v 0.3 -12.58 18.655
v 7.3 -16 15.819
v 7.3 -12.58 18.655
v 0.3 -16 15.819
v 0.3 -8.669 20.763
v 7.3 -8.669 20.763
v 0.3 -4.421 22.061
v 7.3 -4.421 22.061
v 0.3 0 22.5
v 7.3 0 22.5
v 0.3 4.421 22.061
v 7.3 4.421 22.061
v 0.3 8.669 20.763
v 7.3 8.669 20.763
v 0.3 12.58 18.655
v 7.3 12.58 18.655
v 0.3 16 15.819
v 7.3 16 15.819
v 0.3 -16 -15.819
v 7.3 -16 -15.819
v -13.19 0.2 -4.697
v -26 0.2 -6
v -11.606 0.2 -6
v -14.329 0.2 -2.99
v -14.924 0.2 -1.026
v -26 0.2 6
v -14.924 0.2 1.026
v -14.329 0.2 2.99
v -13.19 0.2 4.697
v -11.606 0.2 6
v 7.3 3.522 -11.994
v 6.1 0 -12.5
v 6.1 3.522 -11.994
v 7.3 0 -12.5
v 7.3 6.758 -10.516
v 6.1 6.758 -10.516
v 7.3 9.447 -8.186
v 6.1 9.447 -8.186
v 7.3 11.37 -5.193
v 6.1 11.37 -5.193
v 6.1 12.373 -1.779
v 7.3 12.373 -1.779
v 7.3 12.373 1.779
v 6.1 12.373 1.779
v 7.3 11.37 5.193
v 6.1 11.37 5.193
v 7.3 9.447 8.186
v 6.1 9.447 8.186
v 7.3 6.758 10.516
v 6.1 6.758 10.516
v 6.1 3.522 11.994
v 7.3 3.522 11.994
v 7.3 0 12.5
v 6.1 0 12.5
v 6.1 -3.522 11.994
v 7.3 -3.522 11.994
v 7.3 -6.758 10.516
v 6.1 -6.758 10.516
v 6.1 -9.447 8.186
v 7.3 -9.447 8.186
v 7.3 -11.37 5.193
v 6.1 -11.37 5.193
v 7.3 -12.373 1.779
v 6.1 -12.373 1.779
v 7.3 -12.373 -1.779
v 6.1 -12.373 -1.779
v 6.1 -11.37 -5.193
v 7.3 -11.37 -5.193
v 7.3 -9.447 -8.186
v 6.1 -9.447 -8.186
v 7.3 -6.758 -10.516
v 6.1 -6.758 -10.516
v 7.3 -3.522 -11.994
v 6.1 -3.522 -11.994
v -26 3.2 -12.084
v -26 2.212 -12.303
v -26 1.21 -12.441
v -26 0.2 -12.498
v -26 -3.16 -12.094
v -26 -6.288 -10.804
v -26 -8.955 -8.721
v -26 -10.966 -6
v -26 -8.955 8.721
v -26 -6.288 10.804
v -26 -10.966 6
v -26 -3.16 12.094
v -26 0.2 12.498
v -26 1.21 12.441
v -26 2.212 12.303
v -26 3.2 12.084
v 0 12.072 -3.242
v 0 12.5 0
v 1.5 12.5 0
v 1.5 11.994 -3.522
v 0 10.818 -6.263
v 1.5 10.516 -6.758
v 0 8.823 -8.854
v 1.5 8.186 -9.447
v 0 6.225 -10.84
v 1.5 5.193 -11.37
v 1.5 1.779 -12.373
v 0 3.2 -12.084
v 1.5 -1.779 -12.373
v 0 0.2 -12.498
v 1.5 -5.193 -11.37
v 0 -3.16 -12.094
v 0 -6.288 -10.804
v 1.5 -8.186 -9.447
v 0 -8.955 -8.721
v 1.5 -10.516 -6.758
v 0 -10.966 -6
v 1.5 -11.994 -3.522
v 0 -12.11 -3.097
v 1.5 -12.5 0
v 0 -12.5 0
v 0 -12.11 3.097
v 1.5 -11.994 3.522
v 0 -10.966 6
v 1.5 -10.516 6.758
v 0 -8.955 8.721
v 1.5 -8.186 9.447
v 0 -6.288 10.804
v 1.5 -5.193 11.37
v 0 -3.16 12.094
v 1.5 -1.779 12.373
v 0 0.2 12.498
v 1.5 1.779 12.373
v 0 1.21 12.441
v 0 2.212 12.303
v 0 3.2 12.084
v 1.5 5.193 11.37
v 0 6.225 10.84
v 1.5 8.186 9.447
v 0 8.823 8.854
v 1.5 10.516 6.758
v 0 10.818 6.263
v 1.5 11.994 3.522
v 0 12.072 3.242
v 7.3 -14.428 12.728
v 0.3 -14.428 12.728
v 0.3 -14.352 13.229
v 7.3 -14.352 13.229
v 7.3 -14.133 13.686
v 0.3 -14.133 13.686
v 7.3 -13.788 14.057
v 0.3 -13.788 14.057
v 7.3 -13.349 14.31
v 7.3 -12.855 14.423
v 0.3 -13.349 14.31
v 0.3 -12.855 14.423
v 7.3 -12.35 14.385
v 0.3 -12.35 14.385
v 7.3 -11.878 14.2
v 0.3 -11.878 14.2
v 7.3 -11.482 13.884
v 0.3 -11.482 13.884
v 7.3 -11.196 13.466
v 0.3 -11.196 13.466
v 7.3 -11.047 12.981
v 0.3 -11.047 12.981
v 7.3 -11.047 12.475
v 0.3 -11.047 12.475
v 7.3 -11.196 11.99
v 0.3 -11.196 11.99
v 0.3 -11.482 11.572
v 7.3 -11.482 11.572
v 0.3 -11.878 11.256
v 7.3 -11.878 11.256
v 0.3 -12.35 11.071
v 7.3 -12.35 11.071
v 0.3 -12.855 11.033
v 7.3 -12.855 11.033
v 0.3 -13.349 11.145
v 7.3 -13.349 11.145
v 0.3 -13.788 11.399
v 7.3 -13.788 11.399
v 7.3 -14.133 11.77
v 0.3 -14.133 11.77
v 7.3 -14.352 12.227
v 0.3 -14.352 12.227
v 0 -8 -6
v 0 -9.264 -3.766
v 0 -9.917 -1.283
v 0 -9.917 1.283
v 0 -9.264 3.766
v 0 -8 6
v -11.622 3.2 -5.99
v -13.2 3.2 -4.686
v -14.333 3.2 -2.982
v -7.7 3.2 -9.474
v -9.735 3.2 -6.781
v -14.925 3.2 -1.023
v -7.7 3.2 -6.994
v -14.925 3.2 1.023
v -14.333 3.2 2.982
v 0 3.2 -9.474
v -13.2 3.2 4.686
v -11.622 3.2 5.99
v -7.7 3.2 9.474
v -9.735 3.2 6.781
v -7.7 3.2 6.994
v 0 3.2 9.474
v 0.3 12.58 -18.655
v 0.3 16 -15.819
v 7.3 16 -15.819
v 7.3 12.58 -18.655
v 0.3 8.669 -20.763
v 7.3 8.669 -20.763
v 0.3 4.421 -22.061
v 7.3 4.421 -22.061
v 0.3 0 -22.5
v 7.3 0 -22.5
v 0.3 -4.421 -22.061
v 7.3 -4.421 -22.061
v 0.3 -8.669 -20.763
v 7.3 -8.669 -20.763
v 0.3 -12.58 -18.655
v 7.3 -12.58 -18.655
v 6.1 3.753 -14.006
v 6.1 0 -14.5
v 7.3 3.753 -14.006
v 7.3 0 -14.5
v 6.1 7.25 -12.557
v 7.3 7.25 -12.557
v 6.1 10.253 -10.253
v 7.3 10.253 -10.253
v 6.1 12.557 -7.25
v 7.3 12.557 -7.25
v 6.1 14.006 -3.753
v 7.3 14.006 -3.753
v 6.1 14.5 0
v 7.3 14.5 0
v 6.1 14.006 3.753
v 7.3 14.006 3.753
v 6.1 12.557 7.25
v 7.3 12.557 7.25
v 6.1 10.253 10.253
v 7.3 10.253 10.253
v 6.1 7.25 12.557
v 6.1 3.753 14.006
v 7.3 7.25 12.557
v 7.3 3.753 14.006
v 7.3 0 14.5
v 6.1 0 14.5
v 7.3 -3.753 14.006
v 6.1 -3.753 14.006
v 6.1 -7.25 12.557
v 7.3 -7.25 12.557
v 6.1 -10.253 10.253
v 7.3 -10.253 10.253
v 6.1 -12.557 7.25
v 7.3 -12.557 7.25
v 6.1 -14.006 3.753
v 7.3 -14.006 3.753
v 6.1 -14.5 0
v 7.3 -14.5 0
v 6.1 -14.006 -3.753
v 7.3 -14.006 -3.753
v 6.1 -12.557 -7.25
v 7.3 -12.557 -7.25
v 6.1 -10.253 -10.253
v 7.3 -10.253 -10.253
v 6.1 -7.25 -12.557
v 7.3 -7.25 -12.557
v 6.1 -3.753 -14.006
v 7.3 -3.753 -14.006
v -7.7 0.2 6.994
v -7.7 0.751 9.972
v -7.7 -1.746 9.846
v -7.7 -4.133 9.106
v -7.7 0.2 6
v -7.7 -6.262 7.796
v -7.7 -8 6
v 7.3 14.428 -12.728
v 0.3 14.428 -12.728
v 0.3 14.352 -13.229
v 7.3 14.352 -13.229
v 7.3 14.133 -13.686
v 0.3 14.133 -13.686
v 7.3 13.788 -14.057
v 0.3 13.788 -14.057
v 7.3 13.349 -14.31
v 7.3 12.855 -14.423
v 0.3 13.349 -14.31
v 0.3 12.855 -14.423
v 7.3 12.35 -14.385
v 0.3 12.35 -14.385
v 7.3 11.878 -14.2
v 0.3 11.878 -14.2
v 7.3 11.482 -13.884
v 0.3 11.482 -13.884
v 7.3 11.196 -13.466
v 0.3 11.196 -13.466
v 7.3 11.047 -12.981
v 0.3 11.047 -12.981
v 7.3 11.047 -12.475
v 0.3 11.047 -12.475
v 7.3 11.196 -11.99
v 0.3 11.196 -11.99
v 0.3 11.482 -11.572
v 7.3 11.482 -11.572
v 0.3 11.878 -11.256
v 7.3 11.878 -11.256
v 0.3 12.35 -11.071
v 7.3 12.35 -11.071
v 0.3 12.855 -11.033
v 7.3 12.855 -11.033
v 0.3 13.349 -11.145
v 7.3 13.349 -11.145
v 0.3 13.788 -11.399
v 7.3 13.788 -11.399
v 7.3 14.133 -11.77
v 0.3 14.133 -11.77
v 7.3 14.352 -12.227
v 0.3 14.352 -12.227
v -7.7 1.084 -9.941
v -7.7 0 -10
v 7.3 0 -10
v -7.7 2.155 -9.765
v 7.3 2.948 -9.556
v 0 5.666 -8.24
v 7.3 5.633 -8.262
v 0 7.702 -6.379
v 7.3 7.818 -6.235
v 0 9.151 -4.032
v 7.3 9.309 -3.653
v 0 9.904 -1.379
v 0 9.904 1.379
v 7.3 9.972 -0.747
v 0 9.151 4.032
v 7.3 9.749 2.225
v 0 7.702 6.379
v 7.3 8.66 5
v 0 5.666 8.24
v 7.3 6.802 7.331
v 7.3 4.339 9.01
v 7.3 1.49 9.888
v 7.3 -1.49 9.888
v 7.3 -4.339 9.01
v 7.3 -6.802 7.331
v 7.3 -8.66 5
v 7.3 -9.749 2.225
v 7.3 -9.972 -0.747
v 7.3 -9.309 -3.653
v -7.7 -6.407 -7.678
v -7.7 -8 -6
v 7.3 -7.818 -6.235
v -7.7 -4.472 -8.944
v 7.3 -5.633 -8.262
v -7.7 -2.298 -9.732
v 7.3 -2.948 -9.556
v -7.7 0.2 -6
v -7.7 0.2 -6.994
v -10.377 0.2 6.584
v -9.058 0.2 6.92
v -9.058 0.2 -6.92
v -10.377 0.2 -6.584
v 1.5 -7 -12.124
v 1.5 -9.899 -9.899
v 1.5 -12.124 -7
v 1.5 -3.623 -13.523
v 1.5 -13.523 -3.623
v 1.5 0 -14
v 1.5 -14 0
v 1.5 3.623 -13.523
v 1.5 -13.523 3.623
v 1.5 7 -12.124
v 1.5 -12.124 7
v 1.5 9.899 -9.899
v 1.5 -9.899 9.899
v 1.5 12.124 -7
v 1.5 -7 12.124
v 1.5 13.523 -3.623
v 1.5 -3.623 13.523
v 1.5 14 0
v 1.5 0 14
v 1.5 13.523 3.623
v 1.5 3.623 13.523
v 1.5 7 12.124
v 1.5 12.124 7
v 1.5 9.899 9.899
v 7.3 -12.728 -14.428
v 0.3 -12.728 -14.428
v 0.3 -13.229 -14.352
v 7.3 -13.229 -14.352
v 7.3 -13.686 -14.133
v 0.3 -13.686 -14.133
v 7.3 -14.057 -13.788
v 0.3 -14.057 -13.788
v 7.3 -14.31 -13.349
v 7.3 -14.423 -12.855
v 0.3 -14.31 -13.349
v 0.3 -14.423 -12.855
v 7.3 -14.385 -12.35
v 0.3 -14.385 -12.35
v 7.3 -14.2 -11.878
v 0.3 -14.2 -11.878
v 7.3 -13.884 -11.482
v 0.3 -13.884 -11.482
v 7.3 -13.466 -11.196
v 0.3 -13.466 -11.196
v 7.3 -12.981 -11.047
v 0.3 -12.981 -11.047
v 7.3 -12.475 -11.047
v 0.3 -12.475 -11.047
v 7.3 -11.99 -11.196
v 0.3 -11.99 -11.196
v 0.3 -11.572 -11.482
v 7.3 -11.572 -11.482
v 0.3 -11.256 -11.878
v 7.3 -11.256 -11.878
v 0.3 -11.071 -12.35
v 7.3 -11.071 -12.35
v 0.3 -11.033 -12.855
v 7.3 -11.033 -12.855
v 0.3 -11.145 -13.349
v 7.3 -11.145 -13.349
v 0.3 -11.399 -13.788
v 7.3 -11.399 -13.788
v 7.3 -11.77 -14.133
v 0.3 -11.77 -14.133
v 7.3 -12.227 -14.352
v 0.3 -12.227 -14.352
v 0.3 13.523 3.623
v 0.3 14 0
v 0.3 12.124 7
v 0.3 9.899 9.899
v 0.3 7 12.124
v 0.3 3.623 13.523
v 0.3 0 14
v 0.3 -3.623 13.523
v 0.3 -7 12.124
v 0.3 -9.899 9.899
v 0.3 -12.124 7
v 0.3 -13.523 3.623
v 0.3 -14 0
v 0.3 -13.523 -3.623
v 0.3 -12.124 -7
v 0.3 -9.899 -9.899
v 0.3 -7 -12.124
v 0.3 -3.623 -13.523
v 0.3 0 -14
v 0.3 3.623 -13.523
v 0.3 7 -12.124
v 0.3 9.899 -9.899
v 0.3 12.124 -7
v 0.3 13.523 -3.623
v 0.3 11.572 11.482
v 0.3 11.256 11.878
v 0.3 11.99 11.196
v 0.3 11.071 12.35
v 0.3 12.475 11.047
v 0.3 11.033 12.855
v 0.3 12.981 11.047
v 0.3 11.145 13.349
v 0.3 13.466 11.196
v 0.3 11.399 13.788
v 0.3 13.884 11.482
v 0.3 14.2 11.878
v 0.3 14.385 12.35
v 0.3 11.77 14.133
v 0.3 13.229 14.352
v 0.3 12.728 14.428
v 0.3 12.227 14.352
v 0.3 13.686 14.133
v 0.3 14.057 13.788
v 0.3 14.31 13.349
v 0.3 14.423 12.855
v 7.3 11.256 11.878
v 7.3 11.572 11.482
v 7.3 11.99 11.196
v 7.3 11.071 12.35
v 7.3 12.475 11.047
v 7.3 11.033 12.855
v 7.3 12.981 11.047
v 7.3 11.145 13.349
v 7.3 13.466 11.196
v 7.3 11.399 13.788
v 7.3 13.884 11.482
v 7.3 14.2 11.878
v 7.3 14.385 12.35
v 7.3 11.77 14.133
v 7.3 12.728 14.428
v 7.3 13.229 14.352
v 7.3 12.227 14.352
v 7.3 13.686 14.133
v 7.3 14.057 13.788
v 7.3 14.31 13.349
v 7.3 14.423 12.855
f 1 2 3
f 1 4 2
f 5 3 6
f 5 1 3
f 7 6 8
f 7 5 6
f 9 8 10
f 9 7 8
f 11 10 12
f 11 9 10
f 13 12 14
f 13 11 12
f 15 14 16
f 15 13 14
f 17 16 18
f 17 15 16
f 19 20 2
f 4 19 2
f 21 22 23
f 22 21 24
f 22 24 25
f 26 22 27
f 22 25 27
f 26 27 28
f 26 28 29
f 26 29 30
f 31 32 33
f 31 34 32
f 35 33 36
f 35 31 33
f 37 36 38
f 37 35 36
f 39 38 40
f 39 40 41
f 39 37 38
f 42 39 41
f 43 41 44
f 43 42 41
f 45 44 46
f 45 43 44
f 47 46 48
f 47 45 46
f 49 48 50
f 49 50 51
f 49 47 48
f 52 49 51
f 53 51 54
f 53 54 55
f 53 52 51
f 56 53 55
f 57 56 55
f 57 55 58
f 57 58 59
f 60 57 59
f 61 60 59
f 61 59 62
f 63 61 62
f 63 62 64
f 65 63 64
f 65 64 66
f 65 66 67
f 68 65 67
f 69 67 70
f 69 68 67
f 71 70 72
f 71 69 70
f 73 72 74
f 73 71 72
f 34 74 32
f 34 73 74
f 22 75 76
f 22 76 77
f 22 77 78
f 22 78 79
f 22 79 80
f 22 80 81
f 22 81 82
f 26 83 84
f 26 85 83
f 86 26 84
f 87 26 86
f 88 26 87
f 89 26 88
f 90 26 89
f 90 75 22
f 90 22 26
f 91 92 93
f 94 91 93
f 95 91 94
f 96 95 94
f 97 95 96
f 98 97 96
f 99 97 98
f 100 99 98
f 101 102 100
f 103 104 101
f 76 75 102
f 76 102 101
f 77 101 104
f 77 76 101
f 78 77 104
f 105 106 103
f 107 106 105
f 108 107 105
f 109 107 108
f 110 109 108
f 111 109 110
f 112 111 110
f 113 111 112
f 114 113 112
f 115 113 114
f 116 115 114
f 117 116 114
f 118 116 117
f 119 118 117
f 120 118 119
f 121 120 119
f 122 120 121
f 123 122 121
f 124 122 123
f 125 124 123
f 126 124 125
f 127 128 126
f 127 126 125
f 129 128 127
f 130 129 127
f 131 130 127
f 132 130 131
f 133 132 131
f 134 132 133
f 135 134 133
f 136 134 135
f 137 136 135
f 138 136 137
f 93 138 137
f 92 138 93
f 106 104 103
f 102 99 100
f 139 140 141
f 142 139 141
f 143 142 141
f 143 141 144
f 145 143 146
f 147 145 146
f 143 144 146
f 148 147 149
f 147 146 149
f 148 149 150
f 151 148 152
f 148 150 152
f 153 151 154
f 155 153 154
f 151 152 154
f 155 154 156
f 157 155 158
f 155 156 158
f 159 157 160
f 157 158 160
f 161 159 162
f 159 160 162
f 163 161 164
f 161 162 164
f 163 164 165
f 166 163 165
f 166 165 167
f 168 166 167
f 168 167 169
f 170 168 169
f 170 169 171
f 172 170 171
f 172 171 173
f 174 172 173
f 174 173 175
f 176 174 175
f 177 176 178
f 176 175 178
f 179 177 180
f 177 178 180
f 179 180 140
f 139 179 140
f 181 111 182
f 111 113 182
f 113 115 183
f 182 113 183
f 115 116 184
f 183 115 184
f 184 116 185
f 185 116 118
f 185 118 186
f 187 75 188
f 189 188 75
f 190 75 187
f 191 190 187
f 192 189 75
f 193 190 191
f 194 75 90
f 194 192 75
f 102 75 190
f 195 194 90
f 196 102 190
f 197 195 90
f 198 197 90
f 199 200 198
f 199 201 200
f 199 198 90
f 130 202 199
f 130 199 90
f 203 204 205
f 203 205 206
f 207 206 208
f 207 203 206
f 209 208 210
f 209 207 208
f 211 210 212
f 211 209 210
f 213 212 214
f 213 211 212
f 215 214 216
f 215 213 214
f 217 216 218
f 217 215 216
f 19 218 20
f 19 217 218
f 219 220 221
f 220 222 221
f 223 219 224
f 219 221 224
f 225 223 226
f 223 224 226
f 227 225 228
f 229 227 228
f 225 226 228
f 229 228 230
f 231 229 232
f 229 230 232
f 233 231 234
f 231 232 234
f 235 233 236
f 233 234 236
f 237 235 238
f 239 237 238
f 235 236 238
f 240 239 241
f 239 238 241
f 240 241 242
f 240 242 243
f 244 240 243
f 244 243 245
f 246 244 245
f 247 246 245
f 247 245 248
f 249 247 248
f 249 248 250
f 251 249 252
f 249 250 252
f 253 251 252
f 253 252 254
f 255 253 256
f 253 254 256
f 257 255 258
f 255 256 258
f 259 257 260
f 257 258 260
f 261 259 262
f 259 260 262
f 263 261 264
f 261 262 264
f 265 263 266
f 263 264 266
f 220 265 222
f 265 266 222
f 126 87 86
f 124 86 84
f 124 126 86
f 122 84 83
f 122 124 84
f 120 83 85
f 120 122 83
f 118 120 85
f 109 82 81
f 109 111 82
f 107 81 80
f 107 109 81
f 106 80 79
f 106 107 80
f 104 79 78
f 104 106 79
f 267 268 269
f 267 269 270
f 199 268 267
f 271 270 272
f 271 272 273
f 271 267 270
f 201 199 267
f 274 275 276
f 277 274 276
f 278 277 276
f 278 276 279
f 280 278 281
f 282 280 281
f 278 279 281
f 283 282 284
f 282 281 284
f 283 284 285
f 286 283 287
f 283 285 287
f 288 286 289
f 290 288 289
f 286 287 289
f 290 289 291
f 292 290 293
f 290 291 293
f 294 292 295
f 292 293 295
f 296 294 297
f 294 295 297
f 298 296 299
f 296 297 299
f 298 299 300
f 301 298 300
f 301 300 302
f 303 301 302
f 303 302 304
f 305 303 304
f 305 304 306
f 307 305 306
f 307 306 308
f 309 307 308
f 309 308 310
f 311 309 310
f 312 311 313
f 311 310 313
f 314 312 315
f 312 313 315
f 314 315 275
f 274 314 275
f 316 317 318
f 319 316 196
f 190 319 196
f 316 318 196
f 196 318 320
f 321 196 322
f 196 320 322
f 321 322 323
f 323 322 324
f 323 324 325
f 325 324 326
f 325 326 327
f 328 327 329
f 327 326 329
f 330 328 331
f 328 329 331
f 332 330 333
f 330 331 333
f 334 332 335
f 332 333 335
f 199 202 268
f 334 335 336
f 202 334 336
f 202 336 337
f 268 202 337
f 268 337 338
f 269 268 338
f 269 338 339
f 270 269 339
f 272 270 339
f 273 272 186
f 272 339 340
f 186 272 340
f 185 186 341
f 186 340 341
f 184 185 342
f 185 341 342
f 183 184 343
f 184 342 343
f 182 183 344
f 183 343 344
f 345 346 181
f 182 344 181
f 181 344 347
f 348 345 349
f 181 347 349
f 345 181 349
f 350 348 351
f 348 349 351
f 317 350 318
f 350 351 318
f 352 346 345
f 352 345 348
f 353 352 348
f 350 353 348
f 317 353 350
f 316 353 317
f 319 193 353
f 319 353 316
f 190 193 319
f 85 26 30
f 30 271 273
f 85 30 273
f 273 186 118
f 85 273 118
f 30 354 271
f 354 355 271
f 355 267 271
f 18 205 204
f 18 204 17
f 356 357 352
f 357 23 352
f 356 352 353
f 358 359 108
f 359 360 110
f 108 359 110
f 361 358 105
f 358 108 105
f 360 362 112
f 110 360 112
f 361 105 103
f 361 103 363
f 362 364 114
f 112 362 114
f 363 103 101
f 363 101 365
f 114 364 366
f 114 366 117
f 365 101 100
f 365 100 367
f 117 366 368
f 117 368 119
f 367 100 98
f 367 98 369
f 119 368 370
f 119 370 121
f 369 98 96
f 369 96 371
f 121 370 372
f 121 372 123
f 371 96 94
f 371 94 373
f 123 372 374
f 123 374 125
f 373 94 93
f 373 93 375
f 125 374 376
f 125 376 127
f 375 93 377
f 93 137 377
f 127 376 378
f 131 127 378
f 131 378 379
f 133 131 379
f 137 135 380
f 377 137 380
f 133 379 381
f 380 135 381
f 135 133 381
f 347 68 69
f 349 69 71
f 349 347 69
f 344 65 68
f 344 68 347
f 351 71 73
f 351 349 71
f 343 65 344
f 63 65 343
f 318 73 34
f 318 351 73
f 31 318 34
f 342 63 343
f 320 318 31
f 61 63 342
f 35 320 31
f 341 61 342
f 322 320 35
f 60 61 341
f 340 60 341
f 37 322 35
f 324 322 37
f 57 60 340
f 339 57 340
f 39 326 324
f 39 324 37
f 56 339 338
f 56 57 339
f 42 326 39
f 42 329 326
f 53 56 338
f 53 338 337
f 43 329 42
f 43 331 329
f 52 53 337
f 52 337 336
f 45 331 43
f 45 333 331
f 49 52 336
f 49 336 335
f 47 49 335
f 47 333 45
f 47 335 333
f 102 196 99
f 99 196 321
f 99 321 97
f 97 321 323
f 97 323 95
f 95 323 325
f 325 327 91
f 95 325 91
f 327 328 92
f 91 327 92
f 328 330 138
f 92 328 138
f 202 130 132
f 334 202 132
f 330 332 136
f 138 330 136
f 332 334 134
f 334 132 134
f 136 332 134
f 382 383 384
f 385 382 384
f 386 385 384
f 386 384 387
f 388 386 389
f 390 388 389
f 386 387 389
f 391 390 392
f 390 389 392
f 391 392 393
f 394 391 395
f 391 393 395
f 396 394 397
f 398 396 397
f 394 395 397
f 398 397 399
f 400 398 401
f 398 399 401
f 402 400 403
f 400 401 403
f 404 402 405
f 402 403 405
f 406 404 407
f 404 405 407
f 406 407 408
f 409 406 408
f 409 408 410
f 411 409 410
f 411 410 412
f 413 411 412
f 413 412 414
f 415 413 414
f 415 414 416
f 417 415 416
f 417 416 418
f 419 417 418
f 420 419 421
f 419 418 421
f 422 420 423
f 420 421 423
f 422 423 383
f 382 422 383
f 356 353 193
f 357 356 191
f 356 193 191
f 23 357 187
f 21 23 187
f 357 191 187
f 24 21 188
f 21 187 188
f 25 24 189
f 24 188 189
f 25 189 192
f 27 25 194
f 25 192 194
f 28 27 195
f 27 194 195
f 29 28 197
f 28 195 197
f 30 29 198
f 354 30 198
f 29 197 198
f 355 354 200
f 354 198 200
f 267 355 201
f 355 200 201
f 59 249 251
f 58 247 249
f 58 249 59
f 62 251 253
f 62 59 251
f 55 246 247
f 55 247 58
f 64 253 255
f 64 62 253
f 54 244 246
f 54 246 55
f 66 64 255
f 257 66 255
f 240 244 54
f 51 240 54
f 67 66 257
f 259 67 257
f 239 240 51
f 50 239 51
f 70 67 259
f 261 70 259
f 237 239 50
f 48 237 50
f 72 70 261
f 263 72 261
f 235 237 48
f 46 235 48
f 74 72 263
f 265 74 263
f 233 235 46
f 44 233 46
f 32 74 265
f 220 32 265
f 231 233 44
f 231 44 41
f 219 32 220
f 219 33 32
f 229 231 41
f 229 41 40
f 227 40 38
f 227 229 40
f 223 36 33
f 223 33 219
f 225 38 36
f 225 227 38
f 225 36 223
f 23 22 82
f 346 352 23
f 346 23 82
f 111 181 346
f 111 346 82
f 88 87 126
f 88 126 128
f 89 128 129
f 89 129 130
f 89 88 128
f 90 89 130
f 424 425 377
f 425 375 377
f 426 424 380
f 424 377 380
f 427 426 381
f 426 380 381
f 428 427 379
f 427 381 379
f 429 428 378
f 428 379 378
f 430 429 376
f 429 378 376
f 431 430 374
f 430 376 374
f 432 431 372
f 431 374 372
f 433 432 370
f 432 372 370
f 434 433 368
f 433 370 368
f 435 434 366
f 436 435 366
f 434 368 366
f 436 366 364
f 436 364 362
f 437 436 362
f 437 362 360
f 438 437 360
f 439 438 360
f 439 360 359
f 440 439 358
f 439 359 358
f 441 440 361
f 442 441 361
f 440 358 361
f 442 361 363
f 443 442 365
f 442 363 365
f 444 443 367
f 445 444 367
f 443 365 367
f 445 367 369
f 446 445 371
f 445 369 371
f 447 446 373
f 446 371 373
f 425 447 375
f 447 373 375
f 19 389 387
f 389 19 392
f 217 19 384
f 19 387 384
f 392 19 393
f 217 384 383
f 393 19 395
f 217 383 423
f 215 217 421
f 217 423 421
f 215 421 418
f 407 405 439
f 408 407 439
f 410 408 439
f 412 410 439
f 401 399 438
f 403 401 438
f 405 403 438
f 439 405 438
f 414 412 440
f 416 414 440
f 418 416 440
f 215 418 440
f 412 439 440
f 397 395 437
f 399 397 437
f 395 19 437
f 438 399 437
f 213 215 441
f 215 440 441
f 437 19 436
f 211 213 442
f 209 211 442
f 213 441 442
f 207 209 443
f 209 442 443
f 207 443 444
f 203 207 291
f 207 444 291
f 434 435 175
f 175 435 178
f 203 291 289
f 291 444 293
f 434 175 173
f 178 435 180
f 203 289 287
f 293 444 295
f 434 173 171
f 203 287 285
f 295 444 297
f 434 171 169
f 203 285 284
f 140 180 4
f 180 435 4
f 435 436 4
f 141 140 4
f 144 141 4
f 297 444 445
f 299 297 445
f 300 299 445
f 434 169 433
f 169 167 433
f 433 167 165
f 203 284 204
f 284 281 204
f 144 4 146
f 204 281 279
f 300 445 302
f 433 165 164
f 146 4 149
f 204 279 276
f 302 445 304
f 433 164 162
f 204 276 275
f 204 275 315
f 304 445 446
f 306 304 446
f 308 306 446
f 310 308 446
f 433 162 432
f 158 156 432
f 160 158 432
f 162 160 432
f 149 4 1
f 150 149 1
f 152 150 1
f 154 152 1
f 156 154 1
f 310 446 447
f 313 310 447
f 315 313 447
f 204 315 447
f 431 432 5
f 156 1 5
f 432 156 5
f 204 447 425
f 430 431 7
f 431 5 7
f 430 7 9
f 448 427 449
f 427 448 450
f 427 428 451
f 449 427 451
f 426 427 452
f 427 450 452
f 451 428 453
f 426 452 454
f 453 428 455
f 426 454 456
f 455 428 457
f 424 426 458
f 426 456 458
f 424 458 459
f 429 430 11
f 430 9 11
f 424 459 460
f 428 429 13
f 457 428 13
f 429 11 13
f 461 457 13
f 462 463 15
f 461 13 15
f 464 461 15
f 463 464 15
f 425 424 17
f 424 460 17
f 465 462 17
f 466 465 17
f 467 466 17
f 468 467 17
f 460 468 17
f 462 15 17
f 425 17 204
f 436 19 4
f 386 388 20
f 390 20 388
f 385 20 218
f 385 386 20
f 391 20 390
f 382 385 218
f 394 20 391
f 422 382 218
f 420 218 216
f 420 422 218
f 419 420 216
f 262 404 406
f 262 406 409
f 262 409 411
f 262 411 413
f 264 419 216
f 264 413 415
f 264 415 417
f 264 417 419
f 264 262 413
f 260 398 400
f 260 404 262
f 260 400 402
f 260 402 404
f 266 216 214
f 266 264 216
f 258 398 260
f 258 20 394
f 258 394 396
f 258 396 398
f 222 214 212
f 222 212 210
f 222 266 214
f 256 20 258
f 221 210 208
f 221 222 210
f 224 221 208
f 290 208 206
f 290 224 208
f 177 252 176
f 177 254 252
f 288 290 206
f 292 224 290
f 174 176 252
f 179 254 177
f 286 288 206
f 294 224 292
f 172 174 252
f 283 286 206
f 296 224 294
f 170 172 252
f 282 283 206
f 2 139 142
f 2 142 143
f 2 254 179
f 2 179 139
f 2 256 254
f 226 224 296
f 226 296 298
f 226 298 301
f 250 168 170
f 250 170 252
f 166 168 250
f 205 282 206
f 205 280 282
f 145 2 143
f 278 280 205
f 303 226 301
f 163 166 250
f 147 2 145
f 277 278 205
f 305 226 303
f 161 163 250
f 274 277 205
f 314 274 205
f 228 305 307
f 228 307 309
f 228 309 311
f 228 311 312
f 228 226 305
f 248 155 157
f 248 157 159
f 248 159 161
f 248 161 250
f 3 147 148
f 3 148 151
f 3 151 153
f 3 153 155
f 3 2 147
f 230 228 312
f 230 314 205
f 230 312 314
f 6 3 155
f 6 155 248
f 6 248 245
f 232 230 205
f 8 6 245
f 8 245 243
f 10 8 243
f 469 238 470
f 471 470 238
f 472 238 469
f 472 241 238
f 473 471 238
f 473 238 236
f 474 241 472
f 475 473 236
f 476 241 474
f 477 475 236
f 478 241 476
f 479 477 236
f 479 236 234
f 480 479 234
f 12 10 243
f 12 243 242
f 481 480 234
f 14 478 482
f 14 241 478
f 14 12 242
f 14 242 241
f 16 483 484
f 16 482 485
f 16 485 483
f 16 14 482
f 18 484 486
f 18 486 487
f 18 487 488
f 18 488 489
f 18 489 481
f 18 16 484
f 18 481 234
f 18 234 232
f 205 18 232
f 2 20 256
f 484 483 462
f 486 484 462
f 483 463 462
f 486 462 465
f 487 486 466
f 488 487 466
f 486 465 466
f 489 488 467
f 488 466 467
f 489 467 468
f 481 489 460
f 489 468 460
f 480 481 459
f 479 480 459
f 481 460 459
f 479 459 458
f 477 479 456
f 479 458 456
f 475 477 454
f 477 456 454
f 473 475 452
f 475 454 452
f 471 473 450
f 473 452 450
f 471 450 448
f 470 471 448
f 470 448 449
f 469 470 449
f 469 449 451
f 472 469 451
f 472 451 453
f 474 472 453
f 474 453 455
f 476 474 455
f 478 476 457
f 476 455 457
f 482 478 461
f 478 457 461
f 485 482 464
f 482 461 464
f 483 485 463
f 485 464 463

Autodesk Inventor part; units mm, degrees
ref_plane "YZ Plane" through (0, 0, 0) normal (1, 0, 0) x (0, 1, 0)
ref_plane "XZ Plane" through (0, 0, 0) normal (0, 1, 0) x (-1, 0, 0)
ref_plane "XY Plane" through (0, 0, 0) normal (0, 0, 1) x (1, 0, 0)
sketch "Sketch4" plane through (0, 0, 0) normal (0, 0, 1) x (1, 0, 0)
  line L0 (0, 0) -> (7.3, 0)
  line L1 (7.3, 0) -> (7.3, 22.5)
  line L2 (7.3, 22.5) -> (0.3, 22.5)
  line L3 (0.3, 22.5) -> (0.3, 14)
  line L4 (0.3, 14) -> (1.5, 14)
  line L5 (1.5, 14) -> (1.5, 12.5)
  line L6 (1.5, 12.5) -> (0, 12.5)
  line L7 (0, 12.5) -> (0, 7.5)
  line L8 (0, 7.5) -> (0, 7.5)
  line L9 (0, 7.5) -> (0, 0)
  dimension "d44" = 25
  dimension "d45" = 1.5
  dimension "d46" = 1.2
  dimension "d47" = 1.5
  dimension "d53" = 45
  dimension "d58" = 7
  dimension "d59" = 15
  dimension "d60" = 0
revolve "Revolution2" add sketch "Sketch4" angle 360 about axis through (0, 0, 0) along (1, 0, 0)
sketch "Sketch7" plane through (7.3, 0, 0) normal (1, 0, 0) x (0, 0, -1)
  line L0 (-20, 26) -> (20, 26)
  line L1 (20, 26) -> (20, 16)
  line L2 (20, 16) -> (-20, 16)
  line L3 (-20, 16) -> (-20, 26)
  line L4 (20, -16) -> (-20, -16)
  line L5 (-20, -16) -> (-20, -26)
  line L6 (-20, -26) -> (20, -26)
  line L7 (20, -26) -> (20, -16)
  point P0 (0, 0)
  point P1 (0, 16)
  point P2 (0, -16)
  dimension "d61" = 16
  dimension "d62" = 16
  dimension "d63" = 10
  dimension "d64" = 10
  dimension "d65" = 20
extrude "Extrusion2" cut sketch "Sketch7" against normal blind 20
sketch "Sketch10" plane through (0, 0, 0) normal (-1, 0, 0) x (0, 0, 1)
  circle A0 centre (0, 0) radius 12.5 projected
  circle A1 centre (0, 0) radius 12.5 projected
  line L0 (-12.5, 0) -> (12.5, 0) construction
  line L1 (-12.4984, 0.2) -> (12.4984, 0.2)
  line L2 (-12.0835, 3.2) -> (12.0835, 3.2)
  point P0 (-12.4984, 0.2)
  point P1 (12.4984, 0.2)
  dimension "d72" = 0.2
  dimension "d73" = 3
extrude "Extrusion4" add sketch "Sketch10" along normal blind 26 contours L1 A0 L2
sketch "Sketch11" plane through (0, 3.2, 12.0835) normal (0, 1, 0) x (1, 0, 0)
  circle A0 centre (-8, 12.0835) radius 5 construction
  circle A1 centre (-8, 12.0835) radius 7
  point P0 (0, 12.0835)
  dimension "d76" = 14
extrude "Extrusion5" cut sketch "Sketch11" against normal through all
sketch "Sketch12" plane through (0, 0, 0) normal (-1, 0, 0) x (0, 0, 1)
  line L0 (12.4984, 0.2) -> (-12.4984, 0.2) projected
  arc A0 (-12.4984, 0.2) -> (12.4984, 0.2) centre (0, 0) ccw projected
  line L1 (-6, 0.2) -> (-6, -10.9659)
  circle A1 centre (0, 0) radius 12.5 projected
  line L2 (12.4984, 0.2) -> (-12.4984, 0.2) projected
  line L3 (6, 0.2) -> (6, -10.9659)
  line L4 (-12.4984, 0.2) -> (12.4984, 0.2) projected
  dimension "d79" = 6
  dimension "d80" = 6
extrude "Extrusion6" add sketch "Sketch12" along normal blind 26 contours A0 L3 L0 | L0 L1 A0
sketch "Sketch13" plane through (7.3, 0, 0) normal (1, 0, 0) x (0, 0, -1)
  circle A0 centre (0, 0) radius 12.5 projected
  circle A1 centre (0, 0) radius 10
  dimension "d83" = 20
extrude "Extrusion7" cut sketch "Sketch13" against normal blind 15 contours A1
sketch "Sketch14" plane through (7.3, 0, 0) normal (1, 0, 0) x (0, 0, -1)
  circle A0 centre (0, 0) radius 12.5 projected
  circle A1 centre (0, 0) radius 14.5
  dimension "d86" = 2
extrude "Extrusion8" cut sketch "Sketch14" against normal blind 1.2
sketch "Sketch15" plane through (7.3, 0, 0) normal (1, 0, 0) x (0, 0, -1)
  line L0 (0, 0) -> (12.7279, -12.7279)
  line L1 (0, 0) -> (18, 0) construction
  dimension "d89" = 18
  dimension "d90" = 45
hole "Hole3" at (7.3, -12.7279, -12.7279) direction (-1, 0, 0) diameter 3.4 end through all clearance for "Flat Head Machine Screw" size "M3" standard "Ansi Metric M Profile"
pattern_circular "Circular Pattern2" count 4 over 360 about axis through (0.75, 0, 0) along (1, 0, 0) of "Hole3"
equation "\"d62\" = d61"
equation "\"d64\" = d63"
equation "\"d80\" = d79"
properties part number "022" material "Aluminum 6061"
